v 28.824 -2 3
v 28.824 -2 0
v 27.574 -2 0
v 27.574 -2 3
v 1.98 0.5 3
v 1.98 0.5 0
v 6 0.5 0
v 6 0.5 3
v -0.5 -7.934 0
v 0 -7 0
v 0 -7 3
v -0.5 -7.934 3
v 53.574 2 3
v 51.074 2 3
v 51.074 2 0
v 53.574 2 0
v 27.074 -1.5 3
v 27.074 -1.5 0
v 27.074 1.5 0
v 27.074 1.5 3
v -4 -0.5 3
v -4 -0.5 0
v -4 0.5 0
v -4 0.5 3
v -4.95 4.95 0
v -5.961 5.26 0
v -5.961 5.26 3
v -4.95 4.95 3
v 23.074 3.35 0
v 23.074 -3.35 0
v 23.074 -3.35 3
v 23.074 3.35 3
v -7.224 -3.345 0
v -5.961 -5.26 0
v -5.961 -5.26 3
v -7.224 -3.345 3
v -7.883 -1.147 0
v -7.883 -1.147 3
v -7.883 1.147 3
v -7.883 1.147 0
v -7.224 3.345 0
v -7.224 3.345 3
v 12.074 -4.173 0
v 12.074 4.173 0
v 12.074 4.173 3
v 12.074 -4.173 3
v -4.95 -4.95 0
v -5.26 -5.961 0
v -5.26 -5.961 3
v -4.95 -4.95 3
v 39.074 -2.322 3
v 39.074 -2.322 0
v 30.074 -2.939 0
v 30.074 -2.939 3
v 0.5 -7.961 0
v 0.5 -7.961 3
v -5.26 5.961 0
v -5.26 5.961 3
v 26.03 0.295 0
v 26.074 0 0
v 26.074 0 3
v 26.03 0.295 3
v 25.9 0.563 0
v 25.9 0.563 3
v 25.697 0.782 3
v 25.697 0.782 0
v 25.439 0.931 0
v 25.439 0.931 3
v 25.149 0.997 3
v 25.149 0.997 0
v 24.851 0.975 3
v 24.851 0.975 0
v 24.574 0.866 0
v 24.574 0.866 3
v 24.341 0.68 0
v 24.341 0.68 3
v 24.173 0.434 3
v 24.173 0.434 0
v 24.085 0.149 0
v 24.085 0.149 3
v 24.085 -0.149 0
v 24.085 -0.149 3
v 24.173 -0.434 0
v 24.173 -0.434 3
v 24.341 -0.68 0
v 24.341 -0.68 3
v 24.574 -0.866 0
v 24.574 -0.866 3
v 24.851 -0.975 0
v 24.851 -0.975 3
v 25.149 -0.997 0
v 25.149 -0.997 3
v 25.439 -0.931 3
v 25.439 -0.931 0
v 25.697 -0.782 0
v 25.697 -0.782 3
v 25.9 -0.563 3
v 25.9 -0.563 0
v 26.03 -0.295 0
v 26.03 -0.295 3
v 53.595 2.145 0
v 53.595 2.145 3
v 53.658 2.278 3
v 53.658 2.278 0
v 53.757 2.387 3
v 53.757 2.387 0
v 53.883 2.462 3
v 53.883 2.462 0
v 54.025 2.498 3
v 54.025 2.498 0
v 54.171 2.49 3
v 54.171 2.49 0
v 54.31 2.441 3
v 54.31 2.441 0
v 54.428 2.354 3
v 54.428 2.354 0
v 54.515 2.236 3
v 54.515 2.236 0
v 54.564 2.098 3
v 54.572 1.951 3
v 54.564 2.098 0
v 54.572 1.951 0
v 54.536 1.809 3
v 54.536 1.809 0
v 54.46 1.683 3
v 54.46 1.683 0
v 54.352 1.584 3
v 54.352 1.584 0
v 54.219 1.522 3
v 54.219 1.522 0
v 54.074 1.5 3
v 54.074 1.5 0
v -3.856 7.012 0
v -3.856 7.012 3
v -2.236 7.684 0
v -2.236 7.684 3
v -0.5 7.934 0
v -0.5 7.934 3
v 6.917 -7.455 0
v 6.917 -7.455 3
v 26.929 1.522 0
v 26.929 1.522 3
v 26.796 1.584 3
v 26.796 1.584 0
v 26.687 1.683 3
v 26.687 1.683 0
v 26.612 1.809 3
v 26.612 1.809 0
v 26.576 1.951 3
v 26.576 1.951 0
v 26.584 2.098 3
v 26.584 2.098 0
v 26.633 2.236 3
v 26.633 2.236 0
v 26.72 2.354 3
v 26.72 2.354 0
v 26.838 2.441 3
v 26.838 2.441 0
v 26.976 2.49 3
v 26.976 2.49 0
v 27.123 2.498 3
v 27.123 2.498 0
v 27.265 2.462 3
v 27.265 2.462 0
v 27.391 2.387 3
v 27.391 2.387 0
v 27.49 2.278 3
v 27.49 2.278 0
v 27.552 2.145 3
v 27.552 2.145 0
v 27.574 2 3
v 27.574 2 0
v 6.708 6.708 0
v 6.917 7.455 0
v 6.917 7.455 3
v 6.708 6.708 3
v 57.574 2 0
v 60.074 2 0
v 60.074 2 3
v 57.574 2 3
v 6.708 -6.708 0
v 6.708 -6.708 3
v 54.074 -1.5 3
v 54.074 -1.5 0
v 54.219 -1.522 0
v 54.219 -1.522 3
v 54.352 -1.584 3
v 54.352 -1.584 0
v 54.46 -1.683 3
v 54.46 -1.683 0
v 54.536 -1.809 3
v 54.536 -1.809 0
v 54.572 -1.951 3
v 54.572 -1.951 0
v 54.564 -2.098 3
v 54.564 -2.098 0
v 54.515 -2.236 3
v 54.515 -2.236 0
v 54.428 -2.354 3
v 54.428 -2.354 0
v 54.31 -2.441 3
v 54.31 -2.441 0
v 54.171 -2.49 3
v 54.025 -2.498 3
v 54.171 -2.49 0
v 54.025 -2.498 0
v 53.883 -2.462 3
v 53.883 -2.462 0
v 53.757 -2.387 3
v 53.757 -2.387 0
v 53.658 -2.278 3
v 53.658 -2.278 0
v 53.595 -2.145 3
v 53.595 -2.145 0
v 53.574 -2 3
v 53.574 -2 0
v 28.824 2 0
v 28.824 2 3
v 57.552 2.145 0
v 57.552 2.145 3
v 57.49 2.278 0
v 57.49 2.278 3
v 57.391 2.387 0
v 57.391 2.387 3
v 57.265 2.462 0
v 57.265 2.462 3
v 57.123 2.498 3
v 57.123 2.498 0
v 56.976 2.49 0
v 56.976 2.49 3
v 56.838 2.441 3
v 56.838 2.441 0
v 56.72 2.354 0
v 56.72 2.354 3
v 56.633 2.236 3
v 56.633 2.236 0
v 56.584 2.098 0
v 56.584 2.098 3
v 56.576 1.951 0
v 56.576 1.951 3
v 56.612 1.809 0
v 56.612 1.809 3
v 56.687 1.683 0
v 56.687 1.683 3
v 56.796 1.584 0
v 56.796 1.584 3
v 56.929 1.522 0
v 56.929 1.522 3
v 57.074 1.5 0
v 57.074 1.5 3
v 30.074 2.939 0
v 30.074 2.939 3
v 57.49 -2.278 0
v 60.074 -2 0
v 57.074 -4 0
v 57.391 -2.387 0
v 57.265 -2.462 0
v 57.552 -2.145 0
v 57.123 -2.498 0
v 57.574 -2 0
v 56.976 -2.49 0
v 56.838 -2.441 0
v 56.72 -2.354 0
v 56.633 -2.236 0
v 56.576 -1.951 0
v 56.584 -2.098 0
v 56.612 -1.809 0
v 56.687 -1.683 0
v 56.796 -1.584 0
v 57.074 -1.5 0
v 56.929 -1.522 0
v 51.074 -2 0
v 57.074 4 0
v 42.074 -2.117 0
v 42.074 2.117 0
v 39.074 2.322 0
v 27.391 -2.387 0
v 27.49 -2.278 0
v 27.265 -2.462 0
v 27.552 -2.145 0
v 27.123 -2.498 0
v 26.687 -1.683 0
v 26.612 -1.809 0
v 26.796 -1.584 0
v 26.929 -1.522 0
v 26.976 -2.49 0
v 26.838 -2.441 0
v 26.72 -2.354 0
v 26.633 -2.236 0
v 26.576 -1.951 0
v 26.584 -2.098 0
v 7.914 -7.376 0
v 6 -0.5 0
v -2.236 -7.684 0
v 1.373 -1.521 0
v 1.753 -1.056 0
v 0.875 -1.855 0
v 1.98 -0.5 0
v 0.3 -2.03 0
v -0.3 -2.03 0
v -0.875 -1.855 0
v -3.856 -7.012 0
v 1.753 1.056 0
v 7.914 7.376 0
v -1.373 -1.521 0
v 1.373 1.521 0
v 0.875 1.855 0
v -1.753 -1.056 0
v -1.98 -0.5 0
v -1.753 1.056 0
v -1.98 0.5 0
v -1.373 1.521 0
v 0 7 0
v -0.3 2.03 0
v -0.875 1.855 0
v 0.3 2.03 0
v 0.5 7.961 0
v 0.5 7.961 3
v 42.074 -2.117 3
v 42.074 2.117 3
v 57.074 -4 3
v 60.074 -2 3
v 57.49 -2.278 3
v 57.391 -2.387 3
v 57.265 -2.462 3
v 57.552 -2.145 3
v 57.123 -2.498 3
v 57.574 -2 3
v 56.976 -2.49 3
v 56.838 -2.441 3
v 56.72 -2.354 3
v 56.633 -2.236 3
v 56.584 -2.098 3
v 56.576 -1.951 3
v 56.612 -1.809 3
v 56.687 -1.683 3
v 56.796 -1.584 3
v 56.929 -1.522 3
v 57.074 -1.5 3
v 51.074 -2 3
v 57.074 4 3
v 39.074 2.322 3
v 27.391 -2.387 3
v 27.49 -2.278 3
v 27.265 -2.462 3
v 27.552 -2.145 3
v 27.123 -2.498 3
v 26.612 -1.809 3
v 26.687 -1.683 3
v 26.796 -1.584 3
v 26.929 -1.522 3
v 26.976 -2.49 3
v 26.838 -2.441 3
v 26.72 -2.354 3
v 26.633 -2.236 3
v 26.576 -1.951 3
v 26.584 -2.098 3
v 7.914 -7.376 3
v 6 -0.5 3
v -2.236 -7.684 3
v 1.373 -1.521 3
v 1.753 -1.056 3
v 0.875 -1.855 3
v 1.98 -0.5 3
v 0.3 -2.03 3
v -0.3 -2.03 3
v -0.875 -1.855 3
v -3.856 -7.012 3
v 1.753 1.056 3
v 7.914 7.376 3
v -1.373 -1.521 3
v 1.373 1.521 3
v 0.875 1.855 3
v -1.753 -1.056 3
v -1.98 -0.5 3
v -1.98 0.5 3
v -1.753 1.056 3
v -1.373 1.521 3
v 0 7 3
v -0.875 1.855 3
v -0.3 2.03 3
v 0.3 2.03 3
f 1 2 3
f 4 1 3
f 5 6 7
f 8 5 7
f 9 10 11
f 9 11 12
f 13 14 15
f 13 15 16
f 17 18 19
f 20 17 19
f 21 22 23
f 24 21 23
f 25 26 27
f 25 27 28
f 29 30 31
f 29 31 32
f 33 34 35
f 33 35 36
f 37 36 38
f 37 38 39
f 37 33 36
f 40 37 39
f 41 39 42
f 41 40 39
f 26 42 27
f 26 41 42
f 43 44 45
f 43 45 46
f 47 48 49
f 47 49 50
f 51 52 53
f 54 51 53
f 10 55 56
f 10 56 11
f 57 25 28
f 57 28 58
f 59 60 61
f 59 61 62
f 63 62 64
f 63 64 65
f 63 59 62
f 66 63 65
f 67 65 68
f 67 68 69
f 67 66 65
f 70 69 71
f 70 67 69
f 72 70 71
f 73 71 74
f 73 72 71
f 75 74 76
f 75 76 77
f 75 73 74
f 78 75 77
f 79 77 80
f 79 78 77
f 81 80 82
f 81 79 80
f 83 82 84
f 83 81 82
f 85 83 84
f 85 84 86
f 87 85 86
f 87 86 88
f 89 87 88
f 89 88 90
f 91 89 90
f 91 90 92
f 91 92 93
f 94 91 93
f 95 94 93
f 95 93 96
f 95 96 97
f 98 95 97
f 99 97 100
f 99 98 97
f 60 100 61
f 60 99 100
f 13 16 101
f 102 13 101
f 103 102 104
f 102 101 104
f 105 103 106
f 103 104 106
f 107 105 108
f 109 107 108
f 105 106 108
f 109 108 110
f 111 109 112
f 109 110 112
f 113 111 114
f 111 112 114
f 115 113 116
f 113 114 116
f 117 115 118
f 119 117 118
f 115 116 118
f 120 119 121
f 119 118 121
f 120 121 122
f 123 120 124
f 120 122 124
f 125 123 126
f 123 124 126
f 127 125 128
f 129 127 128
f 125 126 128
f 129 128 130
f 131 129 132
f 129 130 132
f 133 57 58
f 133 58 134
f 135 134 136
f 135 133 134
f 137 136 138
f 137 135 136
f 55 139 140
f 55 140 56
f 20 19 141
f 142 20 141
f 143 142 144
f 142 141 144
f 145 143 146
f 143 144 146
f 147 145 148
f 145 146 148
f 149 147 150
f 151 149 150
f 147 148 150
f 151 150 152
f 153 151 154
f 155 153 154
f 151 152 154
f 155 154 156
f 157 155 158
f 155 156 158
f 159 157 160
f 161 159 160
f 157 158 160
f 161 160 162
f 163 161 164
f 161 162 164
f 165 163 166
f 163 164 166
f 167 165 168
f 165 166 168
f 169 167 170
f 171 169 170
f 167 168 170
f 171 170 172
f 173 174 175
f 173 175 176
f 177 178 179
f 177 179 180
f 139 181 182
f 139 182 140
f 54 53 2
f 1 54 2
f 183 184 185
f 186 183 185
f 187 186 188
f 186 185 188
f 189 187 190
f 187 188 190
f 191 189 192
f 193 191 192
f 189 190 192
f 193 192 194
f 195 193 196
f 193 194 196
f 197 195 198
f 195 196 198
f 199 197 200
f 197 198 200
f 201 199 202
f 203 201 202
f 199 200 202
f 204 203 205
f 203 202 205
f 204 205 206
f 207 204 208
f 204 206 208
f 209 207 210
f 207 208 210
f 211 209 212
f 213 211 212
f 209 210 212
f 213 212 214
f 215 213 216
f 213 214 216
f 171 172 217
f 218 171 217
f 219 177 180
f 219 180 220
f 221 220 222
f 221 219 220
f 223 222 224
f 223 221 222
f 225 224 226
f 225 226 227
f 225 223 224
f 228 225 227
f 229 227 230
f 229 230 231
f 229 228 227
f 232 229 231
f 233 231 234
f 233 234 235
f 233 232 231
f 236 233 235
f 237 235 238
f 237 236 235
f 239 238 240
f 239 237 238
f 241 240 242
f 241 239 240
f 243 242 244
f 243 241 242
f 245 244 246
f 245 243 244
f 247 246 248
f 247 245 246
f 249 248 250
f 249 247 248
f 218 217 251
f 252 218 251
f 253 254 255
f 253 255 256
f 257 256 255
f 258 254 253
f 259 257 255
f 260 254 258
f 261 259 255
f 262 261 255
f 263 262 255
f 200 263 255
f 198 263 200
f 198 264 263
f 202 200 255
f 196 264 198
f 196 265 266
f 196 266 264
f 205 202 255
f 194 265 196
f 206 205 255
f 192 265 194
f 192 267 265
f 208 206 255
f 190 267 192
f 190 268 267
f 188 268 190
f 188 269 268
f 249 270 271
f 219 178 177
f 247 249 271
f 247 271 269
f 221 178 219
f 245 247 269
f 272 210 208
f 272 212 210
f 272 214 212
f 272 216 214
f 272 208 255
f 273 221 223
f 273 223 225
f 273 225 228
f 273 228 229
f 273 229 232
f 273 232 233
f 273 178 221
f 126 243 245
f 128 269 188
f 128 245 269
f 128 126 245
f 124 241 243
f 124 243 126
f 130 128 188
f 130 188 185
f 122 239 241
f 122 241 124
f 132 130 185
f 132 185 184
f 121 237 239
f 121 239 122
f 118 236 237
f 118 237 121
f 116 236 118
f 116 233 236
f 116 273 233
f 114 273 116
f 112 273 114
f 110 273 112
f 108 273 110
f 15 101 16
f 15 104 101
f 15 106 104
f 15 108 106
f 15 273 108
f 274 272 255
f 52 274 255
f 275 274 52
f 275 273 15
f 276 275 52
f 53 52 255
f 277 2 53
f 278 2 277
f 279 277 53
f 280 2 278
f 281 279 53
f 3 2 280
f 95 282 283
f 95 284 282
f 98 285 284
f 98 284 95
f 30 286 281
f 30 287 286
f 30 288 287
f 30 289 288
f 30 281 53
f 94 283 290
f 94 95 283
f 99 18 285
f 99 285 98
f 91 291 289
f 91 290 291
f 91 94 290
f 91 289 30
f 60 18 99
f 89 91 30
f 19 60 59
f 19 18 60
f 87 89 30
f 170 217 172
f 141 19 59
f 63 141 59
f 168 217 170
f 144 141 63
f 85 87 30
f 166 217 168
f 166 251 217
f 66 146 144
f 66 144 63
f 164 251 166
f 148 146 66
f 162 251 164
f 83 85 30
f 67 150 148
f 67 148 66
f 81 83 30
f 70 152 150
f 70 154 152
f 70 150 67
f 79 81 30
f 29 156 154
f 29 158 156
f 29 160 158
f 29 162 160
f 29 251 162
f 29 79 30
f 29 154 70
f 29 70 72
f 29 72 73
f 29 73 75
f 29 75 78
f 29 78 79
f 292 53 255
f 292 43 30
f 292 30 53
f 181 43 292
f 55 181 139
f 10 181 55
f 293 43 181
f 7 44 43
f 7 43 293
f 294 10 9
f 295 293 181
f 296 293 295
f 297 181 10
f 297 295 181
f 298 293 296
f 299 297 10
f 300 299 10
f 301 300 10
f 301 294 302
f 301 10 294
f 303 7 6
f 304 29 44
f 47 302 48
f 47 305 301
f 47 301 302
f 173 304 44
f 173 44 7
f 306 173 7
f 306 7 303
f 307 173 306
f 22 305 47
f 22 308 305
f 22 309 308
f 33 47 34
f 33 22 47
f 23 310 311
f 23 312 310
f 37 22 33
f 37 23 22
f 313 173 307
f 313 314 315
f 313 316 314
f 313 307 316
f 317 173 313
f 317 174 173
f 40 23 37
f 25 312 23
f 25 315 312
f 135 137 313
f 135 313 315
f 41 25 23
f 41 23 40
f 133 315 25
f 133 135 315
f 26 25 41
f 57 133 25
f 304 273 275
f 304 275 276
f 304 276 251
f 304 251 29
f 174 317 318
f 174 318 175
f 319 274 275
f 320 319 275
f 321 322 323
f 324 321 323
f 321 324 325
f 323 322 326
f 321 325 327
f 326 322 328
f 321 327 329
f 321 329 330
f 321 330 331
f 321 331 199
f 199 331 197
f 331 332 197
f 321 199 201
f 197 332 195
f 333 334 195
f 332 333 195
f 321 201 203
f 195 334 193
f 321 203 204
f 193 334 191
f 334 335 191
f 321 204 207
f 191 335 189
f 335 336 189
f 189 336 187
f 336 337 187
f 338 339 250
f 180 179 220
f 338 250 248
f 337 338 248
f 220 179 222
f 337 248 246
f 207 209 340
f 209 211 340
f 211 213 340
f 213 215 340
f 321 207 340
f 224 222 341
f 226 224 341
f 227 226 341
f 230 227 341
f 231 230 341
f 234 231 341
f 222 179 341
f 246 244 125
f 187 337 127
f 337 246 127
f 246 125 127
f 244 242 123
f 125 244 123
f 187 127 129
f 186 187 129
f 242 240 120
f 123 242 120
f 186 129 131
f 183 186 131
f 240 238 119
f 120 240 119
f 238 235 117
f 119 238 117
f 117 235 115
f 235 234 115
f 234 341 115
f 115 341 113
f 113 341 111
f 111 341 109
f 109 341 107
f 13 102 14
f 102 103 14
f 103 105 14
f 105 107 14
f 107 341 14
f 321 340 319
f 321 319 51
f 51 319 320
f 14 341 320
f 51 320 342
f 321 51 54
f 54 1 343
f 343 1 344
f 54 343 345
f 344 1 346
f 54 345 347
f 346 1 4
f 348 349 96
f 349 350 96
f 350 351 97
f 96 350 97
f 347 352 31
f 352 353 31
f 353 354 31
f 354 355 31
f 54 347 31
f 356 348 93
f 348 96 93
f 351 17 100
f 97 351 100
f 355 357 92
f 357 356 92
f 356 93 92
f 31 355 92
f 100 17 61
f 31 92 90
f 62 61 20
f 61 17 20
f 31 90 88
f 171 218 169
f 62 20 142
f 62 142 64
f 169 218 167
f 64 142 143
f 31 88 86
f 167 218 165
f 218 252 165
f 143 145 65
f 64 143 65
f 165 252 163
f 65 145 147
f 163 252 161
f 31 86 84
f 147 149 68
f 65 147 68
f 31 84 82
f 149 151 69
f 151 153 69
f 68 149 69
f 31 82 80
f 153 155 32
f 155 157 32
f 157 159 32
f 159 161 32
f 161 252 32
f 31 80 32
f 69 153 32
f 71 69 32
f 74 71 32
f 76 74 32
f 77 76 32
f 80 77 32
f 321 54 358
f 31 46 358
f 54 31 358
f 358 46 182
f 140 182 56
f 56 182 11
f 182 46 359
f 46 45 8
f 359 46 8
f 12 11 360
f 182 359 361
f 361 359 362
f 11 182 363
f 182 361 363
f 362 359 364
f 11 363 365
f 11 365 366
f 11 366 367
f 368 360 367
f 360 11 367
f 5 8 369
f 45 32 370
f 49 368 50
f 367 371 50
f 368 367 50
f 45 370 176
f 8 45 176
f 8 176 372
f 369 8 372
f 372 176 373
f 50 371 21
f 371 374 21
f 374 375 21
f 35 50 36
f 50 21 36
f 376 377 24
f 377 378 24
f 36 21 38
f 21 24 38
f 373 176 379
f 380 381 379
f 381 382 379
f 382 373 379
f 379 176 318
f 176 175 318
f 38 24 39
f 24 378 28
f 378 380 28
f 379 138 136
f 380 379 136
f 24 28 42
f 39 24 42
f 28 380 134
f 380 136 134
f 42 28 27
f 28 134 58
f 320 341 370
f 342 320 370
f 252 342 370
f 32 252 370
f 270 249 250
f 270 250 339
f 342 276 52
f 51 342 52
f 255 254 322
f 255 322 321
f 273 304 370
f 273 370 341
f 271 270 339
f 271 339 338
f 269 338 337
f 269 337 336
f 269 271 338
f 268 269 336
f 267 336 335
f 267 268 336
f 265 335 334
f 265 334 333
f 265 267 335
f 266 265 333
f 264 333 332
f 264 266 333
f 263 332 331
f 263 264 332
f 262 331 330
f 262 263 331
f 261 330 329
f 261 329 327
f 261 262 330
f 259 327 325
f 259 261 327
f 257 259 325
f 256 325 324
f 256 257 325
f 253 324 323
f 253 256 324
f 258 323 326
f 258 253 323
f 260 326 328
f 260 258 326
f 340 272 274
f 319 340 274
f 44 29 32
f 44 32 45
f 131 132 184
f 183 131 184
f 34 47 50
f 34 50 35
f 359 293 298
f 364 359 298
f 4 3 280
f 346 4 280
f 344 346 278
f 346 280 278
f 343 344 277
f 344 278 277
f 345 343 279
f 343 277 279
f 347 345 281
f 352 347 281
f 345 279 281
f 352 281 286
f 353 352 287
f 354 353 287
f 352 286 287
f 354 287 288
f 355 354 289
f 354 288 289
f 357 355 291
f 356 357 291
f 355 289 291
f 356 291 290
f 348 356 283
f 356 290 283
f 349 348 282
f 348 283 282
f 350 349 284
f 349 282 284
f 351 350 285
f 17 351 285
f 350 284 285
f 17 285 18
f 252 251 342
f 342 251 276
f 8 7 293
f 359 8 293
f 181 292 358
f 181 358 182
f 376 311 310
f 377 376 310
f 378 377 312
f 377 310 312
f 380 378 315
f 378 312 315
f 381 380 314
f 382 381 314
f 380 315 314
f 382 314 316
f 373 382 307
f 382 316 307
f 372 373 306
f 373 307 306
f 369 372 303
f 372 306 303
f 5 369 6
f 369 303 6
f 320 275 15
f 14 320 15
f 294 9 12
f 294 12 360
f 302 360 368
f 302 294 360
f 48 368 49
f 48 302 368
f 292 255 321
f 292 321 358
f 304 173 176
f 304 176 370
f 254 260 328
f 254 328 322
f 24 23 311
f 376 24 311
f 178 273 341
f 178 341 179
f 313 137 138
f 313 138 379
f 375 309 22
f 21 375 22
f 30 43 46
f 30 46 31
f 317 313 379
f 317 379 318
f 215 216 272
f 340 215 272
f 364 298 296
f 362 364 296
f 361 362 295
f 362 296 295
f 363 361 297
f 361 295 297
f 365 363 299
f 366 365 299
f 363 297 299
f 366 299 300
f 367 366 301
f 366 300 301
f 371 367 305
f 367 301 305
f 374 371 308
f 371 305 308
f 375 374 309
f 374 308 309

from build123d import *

# Parameters (mm, degrees)
SKETCH_1_R      = 1.000000438
EXTRUDE_1_DEPTH = 3


with BuildPart() as part:
    # 草图1 → 凸台-拉伸1 (new body)
    with BuildSketch(Plane.XY):
        with BuildLine():
            Line((60.073949397, -2.000000095), (57.073947042, -4.00000019))
            Line((57.073947042, -4.00000019), (7.913790643, -7.376036607))
            Line((7.913790643, -7.376036607), (6.708230358, -6.708230358))
            Line((6.708230358, -6.708230358), (6.916883867, -7.454637904))
            Line((6.916883867, -7.454637904), (0.500000024, -7.960577495))
            Line((0.500000024, -7.960577495), (0, -7.000000216))
            Line((0, -7.000000216), (-0.500000024, -7.934173569))
            ThreePointArc((-0.500000024, -7.934173569), (-3.067102082, -7.398918018), (-5.260177422, -5.961235147))
            Line((-5.260177422, -5.961235147), (-4.949747585, -4.949747585))
            Line((-4.949747585, -4.949747585), (-5.961235147, -5.260177422))
            ThreePointArc((-5.961235147, -5.260177422), (-7.966566676, 0), (-5.961235147, 5.260177422))
            Line((-5.961235147, 5.260177422), (-4.949747585, 4.949747585))
            Line((-4.949747585, 4.949747585), (-5.260177422, 5.961235147))
            ThreePointArc((-5.260177422, 5.961235147), (-3.067102082, 7.398918018), (-0.500000024, 7.934173569))
            Line((-0.500000024, 7.934173569), (0, 7.000000216))
            Line((0, 7.000000216), (0.500000024, 7.960577495))
            Line((0.500000024, 7.960577495), (6.916883867, 7.454637904))
            Line((6.916883867, 7.454637904), (6.708230358, 6.708230358))
            Line((6.708230358, 6.708230358), (7.913790643, 7.376036607))
            Line((7.913790643, 7.376036607), (57.073947042, 4.00000019))
            Line((57.073947042, 4.00000019), (60.073949397, 2.000000095))
            Line((60.073949397, 2.000000095), (57.573948056, 2.000000095))
            ThreePointArc((57.573948056, 2.000000095), (56.720394687, 2.35355404), (57.073947042, 1.500000013))
            Line((57.073947042, 1.500000013), (57.073947042, -1.500000013))
            ThreePointArc((57.073947042, -1.500000013), (56.720394687, -2.35355404), (57.573948055, -2.000000095))
            Line((57.573948055, -2.000000095), (60.073949397, -2.000000095))
        make_face()
        with Locations((25.073947659, -3.992e-06)):
            Circle(SKETCH_1_R, mode=Mode.SUBTRACT)
        with BuildLine():
            Line((42.073946446, 2.116752788), (51.073949784, 2.000000095))
            Line((51.073949784, 2.000000095), (53.5739474, 2.000000095))
            ThreePointArc((53.5739474, 2.000000095), (54.427500768, 2.35355404), (54.073948413, 1.500000013))
            Line((54.073948413, 1.500000013), (54.073948413, -1.500000013))
            ThreePointArc((54.073948413, -1.500000013), (54.427500768, -2.35355404), (53.5739474, -2.000000095))
            Line((53.5739474, -2.000000095), (51.073949784, -2.000000095))
            Line((51.073949784, -2.000000095), (42.073946446, -2.116752788))
            Line((42.073946446, -2.116752788), (42.073946446, 2.116752788))
        make_face(mode=Mode.SUBTRACT)
        with BuildLine():
            Line((27.573948726, 2.000000095), (28.823947534, 2.000000095))
            Line((28.823947534, 2.000000095), (30.073948204, 2.9390899))
            Line((30.073948204, 2.9390899), (39.073947817, 2.322337125))
            Line((39.073947817, 2.322337125), (39.073947817, -2.322337125))
            Line((39.073947817, -2.322337125), (30.073948204, -2.9390899))
            Line((30.073948204, -2.9390899), (28.823947534, -2.000000095))
            Line((28.823947534, -2.000000095), (27.573948726, -2.000000095))
            ThreePointArc((27.573948726, -2.000000095), (26.720395358, -2.35355404), (27.073947713, -1.500000013))
            Line((27.073947713, -1.500000013), (27.073947713, 1.500000013))
            ThreePointArc((27.073947713, 1.500000013), (26.720395358, 2.35355404), (27.573948726, 2.000000095))
        make_face(mode=Mode.SUBTRACT)
        with BuildLine():
            Line((-4.00000019, 0.500000024), (-1.980265602, 0.500000024))
            ThreePointArc((-1.980265602, 0.500000024), (0, 2.052275233), (1.980265603, 0.500000024))
            Line((1.980265603, 0.500000024), (6.000000052, 0.500000024))
            Line((6.000000052, 0.500000024), (6.000000052, -0.500000024))
            Line((6.000000052, -0.500000024), (1.980265602, -0.500000024))
            ThreePointArc((1.980265602, -0.500000024), (0, -2.052275233), (-1.980265603, -0.500000024))
            Line((-1.980265603, -0.500000024), (-4.00000019, -0.500000024))
            Line((-4.00000019, -0.500000024), (-4.00000019, 0.500000024))
        make_face(mode=Mode.SUBTRACT)
        Polygon((12.073948048, -4.172595218), (23.07394892, -3.350258339), (23.07394892, 3.350258339), (12.073948048, 4.172595218), align=None, mode=Mode.SUBTRACT)
    extrude(amount=EXTRUDE_1_DEPTH)


solid = part.part
